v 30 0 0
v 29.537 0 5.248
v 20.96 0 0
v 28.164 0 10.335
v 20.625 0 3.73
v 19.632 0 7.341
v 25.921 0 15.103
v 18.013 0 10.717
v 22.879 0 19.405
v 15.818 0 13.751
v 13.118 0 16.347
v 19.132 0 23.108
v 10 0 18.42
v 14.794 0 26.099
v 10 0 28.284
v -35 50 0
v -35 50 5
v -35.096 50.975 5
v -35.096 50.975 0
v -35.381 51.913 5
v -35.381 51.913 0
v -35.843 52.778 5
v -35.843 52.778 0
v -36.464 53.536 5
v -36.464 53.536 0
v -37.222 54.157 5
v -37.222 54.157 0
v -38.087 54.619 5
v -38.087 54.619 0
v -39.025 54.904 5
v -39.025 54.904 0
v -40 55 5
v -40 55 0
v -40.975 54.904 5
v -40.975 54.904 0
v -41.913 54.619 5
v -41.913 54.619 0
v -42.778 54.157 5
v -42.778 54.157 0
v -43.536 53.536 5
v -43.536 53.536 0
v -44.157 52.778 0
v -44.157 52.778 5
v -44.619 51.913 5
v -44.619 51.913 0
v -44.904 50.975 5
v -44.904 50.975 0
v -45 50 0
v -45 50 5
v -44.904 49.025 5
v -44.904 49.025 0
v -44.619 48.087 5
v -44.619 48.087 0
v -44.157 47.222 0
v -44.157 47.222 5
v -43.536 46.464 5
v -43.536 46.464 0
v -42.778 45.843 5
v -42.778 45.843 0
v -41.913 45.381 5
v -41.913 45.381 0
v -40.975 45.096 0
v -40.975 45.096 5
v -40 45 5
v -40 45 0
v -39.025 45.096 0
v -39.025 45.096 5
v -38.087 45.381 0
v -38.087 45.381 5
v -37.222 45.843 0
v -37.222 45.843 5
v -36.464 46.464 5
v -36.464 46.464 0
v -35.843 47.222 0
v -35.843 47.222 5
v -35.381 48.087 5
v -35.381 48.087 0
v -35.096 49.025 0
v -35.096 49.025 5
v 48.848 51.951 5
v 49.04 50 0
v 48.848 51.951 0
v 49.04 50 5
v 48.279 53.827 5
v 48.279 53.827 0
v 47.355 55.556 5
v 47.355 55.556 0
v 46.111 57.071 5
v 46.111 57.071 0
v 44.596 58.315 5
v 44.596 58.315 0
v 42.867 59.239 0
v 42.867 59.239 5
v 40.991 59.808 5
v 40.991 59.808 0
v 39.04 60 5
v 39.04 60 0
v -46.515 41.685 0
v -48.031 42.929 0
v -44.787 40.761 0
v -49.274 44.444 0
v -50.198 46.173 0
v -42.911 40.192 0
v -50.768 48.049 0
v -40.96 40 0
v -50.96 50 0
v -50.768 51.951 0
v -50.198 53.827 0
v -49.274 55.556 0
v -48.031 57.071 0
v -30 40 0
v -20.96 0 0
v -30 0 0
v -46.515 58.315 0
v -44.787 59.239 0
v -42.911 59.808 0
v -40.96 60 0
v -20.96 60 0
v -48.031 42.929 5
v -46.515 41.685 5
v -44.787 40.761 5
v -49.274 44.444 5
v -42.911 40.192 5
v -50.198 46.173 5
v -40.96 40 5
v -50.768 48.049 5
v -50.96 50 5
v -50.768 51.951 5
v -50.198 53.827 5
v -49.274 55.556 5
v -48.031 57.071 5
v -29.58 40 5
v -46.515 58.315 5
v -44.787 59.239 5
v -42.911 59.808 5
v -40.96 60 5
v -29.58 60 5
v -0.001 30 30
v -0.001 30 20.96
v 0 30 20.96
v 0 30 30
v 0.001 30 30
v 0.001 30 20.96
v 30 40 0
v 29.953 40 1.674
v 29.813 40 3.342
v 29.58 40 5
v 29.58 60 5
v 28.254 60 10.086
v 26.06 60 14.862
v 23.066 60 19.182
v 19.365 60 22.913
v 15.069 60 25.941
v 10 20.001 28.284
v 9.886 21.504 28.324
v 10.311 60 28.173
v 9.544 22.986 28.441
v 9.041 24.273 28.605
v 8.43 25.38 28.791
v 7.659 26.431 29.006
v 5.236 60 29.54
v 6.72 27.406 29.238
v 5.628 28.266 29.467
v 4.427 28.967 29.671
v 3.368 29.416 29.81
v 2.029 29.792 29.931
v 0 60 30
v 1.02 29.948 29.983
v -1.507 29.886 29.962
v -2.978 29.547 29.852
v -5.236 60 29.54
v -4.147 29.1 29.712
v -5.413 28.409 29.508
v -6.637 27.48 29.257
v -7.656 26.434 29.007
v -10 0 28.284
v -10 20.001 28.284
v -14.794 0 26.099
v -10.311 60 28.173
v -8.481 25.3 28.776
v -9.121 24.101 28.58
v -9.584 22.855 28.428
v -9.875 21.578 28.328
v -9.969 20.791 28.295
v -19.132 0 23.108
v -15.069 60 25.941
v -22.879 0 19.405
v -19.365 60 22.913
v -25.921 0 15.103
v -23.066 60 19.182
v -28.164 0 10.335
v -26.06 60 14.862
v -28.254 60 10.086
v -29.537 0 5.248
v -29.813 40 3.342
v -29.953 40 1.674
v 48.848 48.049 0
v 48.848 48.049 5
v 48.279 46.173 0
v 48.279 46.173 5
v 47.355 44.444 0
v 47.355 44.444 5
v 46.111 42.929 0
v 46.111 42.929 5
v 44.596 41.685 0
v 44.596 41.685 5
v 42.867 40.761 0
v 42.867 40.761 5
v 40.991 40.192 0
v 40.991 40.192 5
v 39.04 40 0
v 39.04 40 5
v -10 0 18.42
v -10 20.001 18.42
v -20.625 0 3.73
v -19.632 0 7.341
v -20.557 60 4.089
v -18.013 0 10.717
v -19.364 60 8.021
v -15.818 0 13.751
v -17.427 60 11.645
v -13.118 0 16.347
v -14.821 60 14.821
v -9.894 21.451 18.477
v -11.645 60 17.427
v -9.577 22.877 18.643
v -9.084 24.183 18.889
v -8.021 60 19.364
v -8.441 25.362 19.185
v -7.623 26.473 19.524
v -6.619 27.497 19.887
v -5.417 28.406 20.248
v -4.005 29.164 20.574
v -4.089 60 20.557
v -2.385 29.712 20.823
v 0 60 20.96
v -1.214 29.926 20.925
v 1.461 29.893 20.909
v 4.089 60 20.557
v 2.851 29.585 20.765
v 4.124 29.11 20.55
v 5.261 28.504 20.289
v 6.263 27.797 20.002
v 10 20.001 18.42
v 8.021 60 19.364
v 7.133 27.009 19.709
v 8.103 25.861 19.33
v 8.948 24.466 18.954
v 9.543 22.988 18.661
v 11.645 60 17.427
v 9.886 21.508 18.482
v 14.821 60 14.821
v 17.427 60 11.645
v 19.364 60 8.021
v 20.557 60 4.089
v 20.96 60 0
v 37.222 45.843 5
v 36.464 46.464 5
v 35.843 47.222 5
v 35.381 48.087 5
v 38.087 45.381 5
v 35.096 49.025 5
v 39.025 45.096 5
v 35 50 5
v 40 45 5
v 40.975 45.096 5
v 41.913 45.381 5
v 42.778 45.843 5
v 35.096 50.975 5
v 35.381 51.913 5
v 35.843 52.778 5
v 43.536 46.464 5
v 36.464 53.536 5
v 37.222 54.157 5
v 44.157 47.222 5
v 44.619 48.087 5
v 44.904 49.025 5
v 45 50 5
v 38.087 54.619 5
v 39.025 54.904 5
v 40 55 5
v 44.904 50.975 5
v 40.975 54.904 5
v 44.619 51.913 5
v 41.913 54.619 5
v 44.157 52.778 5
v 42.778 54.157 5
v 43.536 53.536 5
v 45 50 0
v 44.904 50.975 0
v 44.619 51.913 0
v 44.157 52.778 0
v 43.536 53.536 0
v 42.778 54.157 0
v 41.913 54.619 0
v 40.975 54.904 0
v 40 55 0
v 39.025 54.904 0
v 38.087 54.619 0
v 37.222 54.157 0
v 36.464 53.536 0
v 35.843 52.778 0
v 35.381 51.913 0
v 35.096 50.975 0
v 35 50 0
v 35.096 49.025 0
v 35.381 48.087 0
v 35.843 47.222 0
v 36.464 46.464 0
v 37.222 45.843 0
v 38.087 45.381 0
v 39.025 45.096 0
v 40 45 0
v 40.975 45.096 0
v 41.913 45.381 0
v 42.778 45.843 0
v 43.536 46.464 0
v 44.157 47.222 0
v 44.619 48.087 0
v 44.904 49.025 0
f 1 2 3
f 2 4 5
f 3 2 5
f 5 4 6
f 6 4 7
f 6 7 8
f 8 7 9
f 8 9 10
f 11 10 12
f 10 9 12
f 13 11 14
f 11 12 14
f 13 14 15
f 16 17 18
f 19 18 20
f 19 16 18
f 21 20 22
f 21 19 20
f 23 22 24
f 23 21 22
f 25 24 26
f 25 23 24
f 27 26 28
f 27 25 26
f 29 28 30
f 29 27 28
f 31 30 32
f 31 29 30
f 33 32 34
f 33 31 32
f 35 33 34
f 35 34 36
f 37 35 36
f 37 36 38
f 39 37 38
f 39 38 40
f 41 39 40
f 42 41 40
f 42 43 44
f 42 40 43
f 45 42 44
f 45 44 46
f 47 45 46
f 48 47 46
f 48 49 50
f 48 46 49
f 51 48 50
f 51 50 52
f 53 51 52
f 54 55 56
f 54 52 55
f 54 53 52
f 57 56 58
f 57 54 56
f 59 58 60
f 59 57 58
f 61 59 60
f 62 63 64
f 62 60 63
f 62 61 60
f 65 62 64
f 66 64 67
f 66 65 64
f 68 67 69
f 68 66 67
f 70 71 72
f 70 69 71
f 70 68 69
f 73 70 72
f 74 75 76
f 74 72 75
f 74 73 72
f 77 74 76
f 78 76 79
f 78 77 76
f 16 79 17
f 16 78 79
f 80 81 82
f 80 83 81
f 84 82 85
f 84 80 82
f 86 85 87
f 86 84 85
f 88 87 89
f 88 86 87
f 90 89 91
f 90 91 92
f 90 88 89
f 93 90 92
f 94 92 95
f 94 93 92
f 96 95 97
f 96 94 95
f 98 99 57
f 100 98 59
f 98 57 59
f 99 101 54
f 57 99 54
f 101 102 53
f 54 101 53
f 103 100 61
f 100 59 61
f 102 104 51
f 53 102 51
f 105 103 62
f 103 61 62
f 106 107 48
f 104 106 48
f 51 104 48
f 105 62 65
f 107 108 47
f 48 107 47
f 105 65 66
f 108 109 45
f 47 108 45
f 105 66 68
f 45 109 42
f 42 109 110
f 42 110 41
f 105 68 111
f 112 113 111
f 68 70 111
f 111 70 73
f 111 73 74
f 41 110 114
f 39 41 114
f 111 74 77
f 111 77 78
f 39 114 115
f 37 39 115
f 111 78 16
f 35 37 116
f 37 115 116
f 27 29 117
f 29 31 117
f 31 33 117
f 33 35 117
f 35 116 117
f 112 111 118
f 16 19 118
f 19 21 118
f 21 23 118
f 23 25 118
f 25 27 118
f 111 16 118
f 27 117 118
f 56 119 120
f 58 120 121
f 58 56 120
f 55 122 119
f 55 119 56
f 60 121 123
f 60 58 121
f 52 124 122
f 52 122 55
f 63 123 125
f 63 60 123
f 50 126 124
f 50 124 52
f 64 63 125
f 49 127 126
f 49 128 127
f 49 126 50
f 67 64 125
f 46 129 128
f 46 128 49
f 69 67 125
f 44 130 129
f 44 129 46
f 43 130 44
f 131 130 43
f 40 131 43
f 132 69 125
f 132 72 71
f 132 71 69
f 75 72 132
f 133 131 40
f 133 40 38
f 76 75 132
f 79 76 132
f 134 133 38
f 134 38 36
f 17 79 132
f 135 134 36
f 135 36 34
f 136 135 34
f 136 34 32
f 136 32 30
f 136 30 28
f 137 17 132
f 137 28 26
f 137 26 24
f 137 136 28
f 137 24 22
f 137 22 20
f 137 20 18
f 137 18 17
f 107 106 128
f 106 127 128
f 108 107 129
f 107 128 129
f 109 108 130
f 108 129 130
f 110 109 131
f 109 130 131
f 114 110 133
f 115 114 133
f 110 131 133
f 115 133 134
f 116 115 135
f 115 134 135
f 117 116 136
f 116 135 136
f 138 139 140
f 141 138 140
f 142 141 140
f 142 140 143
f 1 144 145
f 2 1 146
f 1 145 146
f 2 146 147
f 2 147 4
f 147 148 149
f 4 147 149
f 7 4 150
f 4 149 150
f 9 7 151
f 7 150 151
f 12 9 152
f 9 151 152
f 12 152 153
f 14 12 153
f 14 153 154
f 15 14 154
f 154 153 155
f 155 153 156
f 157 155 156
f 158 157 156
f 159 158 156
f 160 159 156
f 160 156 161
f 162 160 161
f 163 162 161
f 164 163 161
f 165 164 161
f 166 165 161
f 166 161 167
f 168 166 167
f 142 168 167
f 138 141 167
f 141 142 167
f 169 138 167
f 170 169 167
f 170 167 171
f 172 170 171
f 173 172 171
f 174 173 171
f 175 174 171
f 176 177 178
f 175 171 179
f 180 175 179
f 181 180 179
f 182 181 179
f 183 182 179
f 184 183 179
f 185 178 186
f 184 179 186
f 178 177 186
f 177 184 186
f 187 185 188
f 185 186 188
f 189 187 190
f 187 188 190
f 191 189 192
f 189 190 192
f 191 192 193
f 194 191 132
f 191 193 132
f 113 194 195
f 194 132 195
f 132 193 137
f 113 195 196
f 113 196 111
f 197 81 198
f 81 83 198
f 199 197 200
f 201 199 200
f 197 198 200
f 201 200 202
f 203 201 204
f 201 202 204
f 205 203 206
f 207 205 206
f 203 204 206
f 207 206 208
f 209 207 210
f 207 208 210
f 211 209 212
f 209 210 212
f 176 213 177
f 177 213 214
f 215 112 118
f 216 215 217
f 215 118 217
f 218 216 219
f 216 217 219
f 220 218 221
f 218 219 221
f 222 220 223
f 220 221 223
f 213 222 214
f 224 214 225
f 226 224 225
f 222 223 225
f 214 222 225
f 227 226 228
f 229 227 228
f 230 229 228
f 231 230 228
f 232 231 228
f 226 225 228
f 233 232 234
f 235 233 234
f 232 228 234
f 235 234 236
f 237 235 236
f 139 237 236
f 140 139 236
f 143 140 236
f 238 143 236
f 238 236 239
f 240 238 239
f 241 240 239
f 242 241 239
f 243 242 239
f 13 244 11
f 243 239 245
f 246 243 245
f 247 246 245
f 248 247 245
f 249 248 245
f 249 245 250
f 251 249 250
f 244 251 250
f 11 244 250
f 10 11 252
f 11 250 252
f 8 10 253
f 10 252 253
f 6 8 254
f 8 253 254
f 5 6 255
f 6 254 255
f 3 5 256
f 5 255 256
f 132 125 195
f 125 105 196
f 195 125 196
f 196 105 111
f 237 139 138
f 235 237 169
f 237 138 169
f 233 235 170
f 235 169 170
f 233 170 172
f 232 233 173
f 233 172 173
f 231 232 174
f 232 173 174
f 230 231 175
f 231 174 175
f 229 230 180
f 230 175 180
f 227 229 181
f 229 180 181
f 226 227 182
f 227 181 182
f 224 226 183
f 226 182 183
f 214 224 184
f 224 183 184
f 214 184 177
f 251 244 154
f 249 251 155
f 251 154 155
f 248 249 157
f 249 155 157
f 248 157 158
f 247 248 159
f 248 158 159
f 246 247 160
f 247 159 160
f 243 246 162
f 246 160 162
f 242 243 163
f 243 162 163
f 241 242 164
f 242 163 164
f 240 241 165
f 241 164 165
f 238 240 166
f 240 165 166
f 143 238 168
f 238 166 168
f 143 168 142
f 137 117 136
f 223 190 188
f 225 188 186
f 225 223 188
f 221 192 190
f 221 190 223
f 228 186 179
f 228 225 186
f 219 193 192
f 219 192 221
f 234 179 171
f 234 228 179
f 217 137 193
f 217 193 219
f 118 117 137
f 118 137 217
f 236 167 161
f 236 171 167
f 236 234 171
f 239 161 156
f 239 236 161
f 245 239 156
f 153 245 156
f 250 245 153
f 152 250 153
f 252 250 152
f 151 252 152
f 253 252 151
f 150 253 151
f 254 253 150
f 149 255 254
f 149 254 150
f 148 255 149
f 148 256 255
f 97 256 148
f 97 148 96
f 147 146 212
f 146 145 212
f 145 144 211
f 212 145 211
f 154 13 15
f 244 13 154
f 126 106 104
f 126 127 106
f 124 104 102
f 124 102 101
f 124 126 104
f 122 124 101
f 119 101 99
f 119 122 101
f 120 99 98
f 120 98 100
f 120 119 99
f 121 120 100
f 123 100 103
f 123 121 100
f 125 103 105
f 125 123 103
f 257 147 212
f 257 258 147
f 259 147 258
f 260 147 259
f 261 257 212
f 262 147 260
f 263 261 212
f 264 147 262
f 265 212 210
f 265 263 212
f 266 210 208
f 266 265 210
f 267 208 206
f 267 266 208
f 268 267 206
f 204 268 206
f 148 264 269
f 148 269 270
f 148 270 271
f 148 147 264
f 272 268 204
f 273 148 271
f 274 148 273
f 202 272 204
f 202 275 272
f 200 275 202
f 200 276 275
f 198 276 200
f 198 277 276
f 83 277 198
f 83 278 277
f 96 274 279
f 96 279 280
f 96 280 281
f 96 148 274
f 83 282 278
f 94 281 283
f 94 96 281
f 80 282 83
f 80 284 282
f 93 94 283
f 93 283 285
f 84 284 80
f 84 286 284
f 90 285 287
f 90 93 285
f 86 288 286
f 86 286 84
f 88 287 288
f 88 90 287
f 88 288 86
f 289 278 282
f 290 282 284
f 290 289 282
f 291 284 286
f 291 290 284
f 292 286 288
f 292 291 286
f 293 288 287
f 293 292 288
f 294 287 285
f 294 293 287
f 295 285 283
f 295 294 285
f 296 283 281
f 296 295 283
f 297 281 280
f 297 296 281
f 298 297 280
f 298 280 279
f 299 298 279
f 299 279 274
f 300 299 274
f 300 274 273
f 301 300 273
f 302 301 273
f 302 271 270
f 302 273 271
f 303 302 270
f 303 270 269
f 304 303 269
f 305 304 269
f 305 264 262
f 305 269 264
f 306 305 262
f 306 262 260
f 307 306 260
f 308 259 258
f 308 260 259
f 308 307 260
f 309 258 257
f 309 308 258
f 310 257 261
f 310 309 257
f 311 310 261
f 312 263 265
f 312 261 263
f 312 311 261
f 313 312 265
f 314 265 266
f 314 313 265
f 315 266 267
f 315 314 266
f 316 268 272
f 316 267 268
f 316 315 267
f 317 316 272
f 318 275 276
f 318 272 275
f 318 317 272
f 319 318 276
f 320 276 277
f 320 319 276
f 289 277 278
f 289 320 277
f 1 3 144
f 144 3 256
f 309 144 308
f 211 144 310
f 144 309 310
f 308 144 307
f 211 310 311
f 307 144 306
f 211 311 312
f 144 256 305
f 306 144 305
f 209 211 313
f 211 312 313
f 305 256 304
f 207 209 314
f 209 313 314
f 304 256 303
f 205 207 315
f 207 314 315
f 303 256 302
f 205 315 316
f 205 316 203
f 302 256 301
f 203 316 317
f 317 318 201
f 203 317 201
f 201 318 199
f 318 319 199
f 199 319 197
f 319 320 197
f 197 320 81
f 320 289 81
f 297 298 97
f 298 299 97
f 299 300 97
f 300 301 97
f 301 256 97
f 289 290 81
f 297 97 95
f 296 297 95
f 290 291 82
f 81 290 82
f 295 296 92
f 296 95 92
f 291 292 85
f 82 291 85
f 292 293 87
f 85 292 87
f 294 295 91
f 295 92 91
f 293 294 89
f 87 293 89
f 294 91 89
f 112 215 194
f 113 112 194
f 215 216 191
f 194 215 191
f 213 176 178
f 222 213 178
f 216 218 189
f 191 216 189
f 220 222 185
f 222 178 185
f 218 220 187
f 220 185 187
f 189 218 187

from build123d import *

# Parameters (mm, degrees)
F1_W      = 30
F1_H      = 60
F2_ANGLE  = 180
F3_W      = 100
F3_H      = 20
F4_DEPTH  = 5
F5_R      = 9.99999
F6_R      = 5
F7_DEPTH  = 30.001
F8_W      = 20
F8_H      = 30
F9_DEPTH  = 30.001
F10_R     = 9.999
F11_R     = 20.9596675634
F12_DEPTH = 60.0010001


# Not quite as in the source:
# - a fillet or chamfer is up to 0.001 mm smaller than in the source, because OpenCascade refuses the exact size


with BuildPart() as f2:
    # F1 (on Top) → F2 (revolve)
    with BuildSketch(Plane.XY):
        with Locations((15, 30)):
            Rectangle(F1_W, F1_H)
    revolve(axis=Axis((0, 30, 0), (0, -1, 0)), revolution_arc=F2_ANGLE)

    # F3 (on Top) → F4 (join)
    with BuildSketch(Plane.XY):
        with Locations((-0.9596675634, 50)):
            Rectangle(F3_W, F3_H)
    extrude(amount=F4_DEPTH)

    # F5 (radius 10 in the source; OpenCascade refuses exactly that, so slightly less here)
    f5_edges = [f2.edges().sort_by_distance(p)[0] for p in [
        (-50.959668, 60, 2.5),
        (-50.959668, 40, 2.5),
        (49.040332, 40, 2.5),
        (49.040332, 60, 2.5),
    ]]
    fillet(f5_edges, radius=F5_R)

    # F6 (on Top) → F7 (cut, through all)
    with BuildSketch(Plane.XY):
        with Locations((40, 50)):
            Circle(F6_R)
        with Locations((-40, 50)):
            Circle(F6_R)
    extrude(amount=F7_DEPTH, mode=Mode.SUBTRACT)

    # F8 (on Top) → F9 (cut, through all)
    with BuildSketch(Plane.XY):
        with Locations((0, 15)):
            Rectangle(F8_W, F8_H)
    extrude(amount=F9_DEPTH, mode=Mode.SUBTRACT)

    # F10 (radius 10 in the source; OpenCascade refuses exactly that, so slightly less here)
    f10_edges = [f2.edges().sort_by_distance(p)[0] for p in [
        (-10, 30, 14.142136),
        (10, 30, 14.142136),
    ]]
    fillet(f10_edges, radius=F10_R)

    # F11 (on face) → F12 (cut, through all)
    with BuildSketch(Plane(origin=(0, 60, 0), x_dir=(-1, 0, 0), z_dir=(0, 1, 0))):
        Circle(F11_R)
    extrude(amount=-F12_DEPTH, mode=Mode.SUBTRACT)


solid = f2.part
